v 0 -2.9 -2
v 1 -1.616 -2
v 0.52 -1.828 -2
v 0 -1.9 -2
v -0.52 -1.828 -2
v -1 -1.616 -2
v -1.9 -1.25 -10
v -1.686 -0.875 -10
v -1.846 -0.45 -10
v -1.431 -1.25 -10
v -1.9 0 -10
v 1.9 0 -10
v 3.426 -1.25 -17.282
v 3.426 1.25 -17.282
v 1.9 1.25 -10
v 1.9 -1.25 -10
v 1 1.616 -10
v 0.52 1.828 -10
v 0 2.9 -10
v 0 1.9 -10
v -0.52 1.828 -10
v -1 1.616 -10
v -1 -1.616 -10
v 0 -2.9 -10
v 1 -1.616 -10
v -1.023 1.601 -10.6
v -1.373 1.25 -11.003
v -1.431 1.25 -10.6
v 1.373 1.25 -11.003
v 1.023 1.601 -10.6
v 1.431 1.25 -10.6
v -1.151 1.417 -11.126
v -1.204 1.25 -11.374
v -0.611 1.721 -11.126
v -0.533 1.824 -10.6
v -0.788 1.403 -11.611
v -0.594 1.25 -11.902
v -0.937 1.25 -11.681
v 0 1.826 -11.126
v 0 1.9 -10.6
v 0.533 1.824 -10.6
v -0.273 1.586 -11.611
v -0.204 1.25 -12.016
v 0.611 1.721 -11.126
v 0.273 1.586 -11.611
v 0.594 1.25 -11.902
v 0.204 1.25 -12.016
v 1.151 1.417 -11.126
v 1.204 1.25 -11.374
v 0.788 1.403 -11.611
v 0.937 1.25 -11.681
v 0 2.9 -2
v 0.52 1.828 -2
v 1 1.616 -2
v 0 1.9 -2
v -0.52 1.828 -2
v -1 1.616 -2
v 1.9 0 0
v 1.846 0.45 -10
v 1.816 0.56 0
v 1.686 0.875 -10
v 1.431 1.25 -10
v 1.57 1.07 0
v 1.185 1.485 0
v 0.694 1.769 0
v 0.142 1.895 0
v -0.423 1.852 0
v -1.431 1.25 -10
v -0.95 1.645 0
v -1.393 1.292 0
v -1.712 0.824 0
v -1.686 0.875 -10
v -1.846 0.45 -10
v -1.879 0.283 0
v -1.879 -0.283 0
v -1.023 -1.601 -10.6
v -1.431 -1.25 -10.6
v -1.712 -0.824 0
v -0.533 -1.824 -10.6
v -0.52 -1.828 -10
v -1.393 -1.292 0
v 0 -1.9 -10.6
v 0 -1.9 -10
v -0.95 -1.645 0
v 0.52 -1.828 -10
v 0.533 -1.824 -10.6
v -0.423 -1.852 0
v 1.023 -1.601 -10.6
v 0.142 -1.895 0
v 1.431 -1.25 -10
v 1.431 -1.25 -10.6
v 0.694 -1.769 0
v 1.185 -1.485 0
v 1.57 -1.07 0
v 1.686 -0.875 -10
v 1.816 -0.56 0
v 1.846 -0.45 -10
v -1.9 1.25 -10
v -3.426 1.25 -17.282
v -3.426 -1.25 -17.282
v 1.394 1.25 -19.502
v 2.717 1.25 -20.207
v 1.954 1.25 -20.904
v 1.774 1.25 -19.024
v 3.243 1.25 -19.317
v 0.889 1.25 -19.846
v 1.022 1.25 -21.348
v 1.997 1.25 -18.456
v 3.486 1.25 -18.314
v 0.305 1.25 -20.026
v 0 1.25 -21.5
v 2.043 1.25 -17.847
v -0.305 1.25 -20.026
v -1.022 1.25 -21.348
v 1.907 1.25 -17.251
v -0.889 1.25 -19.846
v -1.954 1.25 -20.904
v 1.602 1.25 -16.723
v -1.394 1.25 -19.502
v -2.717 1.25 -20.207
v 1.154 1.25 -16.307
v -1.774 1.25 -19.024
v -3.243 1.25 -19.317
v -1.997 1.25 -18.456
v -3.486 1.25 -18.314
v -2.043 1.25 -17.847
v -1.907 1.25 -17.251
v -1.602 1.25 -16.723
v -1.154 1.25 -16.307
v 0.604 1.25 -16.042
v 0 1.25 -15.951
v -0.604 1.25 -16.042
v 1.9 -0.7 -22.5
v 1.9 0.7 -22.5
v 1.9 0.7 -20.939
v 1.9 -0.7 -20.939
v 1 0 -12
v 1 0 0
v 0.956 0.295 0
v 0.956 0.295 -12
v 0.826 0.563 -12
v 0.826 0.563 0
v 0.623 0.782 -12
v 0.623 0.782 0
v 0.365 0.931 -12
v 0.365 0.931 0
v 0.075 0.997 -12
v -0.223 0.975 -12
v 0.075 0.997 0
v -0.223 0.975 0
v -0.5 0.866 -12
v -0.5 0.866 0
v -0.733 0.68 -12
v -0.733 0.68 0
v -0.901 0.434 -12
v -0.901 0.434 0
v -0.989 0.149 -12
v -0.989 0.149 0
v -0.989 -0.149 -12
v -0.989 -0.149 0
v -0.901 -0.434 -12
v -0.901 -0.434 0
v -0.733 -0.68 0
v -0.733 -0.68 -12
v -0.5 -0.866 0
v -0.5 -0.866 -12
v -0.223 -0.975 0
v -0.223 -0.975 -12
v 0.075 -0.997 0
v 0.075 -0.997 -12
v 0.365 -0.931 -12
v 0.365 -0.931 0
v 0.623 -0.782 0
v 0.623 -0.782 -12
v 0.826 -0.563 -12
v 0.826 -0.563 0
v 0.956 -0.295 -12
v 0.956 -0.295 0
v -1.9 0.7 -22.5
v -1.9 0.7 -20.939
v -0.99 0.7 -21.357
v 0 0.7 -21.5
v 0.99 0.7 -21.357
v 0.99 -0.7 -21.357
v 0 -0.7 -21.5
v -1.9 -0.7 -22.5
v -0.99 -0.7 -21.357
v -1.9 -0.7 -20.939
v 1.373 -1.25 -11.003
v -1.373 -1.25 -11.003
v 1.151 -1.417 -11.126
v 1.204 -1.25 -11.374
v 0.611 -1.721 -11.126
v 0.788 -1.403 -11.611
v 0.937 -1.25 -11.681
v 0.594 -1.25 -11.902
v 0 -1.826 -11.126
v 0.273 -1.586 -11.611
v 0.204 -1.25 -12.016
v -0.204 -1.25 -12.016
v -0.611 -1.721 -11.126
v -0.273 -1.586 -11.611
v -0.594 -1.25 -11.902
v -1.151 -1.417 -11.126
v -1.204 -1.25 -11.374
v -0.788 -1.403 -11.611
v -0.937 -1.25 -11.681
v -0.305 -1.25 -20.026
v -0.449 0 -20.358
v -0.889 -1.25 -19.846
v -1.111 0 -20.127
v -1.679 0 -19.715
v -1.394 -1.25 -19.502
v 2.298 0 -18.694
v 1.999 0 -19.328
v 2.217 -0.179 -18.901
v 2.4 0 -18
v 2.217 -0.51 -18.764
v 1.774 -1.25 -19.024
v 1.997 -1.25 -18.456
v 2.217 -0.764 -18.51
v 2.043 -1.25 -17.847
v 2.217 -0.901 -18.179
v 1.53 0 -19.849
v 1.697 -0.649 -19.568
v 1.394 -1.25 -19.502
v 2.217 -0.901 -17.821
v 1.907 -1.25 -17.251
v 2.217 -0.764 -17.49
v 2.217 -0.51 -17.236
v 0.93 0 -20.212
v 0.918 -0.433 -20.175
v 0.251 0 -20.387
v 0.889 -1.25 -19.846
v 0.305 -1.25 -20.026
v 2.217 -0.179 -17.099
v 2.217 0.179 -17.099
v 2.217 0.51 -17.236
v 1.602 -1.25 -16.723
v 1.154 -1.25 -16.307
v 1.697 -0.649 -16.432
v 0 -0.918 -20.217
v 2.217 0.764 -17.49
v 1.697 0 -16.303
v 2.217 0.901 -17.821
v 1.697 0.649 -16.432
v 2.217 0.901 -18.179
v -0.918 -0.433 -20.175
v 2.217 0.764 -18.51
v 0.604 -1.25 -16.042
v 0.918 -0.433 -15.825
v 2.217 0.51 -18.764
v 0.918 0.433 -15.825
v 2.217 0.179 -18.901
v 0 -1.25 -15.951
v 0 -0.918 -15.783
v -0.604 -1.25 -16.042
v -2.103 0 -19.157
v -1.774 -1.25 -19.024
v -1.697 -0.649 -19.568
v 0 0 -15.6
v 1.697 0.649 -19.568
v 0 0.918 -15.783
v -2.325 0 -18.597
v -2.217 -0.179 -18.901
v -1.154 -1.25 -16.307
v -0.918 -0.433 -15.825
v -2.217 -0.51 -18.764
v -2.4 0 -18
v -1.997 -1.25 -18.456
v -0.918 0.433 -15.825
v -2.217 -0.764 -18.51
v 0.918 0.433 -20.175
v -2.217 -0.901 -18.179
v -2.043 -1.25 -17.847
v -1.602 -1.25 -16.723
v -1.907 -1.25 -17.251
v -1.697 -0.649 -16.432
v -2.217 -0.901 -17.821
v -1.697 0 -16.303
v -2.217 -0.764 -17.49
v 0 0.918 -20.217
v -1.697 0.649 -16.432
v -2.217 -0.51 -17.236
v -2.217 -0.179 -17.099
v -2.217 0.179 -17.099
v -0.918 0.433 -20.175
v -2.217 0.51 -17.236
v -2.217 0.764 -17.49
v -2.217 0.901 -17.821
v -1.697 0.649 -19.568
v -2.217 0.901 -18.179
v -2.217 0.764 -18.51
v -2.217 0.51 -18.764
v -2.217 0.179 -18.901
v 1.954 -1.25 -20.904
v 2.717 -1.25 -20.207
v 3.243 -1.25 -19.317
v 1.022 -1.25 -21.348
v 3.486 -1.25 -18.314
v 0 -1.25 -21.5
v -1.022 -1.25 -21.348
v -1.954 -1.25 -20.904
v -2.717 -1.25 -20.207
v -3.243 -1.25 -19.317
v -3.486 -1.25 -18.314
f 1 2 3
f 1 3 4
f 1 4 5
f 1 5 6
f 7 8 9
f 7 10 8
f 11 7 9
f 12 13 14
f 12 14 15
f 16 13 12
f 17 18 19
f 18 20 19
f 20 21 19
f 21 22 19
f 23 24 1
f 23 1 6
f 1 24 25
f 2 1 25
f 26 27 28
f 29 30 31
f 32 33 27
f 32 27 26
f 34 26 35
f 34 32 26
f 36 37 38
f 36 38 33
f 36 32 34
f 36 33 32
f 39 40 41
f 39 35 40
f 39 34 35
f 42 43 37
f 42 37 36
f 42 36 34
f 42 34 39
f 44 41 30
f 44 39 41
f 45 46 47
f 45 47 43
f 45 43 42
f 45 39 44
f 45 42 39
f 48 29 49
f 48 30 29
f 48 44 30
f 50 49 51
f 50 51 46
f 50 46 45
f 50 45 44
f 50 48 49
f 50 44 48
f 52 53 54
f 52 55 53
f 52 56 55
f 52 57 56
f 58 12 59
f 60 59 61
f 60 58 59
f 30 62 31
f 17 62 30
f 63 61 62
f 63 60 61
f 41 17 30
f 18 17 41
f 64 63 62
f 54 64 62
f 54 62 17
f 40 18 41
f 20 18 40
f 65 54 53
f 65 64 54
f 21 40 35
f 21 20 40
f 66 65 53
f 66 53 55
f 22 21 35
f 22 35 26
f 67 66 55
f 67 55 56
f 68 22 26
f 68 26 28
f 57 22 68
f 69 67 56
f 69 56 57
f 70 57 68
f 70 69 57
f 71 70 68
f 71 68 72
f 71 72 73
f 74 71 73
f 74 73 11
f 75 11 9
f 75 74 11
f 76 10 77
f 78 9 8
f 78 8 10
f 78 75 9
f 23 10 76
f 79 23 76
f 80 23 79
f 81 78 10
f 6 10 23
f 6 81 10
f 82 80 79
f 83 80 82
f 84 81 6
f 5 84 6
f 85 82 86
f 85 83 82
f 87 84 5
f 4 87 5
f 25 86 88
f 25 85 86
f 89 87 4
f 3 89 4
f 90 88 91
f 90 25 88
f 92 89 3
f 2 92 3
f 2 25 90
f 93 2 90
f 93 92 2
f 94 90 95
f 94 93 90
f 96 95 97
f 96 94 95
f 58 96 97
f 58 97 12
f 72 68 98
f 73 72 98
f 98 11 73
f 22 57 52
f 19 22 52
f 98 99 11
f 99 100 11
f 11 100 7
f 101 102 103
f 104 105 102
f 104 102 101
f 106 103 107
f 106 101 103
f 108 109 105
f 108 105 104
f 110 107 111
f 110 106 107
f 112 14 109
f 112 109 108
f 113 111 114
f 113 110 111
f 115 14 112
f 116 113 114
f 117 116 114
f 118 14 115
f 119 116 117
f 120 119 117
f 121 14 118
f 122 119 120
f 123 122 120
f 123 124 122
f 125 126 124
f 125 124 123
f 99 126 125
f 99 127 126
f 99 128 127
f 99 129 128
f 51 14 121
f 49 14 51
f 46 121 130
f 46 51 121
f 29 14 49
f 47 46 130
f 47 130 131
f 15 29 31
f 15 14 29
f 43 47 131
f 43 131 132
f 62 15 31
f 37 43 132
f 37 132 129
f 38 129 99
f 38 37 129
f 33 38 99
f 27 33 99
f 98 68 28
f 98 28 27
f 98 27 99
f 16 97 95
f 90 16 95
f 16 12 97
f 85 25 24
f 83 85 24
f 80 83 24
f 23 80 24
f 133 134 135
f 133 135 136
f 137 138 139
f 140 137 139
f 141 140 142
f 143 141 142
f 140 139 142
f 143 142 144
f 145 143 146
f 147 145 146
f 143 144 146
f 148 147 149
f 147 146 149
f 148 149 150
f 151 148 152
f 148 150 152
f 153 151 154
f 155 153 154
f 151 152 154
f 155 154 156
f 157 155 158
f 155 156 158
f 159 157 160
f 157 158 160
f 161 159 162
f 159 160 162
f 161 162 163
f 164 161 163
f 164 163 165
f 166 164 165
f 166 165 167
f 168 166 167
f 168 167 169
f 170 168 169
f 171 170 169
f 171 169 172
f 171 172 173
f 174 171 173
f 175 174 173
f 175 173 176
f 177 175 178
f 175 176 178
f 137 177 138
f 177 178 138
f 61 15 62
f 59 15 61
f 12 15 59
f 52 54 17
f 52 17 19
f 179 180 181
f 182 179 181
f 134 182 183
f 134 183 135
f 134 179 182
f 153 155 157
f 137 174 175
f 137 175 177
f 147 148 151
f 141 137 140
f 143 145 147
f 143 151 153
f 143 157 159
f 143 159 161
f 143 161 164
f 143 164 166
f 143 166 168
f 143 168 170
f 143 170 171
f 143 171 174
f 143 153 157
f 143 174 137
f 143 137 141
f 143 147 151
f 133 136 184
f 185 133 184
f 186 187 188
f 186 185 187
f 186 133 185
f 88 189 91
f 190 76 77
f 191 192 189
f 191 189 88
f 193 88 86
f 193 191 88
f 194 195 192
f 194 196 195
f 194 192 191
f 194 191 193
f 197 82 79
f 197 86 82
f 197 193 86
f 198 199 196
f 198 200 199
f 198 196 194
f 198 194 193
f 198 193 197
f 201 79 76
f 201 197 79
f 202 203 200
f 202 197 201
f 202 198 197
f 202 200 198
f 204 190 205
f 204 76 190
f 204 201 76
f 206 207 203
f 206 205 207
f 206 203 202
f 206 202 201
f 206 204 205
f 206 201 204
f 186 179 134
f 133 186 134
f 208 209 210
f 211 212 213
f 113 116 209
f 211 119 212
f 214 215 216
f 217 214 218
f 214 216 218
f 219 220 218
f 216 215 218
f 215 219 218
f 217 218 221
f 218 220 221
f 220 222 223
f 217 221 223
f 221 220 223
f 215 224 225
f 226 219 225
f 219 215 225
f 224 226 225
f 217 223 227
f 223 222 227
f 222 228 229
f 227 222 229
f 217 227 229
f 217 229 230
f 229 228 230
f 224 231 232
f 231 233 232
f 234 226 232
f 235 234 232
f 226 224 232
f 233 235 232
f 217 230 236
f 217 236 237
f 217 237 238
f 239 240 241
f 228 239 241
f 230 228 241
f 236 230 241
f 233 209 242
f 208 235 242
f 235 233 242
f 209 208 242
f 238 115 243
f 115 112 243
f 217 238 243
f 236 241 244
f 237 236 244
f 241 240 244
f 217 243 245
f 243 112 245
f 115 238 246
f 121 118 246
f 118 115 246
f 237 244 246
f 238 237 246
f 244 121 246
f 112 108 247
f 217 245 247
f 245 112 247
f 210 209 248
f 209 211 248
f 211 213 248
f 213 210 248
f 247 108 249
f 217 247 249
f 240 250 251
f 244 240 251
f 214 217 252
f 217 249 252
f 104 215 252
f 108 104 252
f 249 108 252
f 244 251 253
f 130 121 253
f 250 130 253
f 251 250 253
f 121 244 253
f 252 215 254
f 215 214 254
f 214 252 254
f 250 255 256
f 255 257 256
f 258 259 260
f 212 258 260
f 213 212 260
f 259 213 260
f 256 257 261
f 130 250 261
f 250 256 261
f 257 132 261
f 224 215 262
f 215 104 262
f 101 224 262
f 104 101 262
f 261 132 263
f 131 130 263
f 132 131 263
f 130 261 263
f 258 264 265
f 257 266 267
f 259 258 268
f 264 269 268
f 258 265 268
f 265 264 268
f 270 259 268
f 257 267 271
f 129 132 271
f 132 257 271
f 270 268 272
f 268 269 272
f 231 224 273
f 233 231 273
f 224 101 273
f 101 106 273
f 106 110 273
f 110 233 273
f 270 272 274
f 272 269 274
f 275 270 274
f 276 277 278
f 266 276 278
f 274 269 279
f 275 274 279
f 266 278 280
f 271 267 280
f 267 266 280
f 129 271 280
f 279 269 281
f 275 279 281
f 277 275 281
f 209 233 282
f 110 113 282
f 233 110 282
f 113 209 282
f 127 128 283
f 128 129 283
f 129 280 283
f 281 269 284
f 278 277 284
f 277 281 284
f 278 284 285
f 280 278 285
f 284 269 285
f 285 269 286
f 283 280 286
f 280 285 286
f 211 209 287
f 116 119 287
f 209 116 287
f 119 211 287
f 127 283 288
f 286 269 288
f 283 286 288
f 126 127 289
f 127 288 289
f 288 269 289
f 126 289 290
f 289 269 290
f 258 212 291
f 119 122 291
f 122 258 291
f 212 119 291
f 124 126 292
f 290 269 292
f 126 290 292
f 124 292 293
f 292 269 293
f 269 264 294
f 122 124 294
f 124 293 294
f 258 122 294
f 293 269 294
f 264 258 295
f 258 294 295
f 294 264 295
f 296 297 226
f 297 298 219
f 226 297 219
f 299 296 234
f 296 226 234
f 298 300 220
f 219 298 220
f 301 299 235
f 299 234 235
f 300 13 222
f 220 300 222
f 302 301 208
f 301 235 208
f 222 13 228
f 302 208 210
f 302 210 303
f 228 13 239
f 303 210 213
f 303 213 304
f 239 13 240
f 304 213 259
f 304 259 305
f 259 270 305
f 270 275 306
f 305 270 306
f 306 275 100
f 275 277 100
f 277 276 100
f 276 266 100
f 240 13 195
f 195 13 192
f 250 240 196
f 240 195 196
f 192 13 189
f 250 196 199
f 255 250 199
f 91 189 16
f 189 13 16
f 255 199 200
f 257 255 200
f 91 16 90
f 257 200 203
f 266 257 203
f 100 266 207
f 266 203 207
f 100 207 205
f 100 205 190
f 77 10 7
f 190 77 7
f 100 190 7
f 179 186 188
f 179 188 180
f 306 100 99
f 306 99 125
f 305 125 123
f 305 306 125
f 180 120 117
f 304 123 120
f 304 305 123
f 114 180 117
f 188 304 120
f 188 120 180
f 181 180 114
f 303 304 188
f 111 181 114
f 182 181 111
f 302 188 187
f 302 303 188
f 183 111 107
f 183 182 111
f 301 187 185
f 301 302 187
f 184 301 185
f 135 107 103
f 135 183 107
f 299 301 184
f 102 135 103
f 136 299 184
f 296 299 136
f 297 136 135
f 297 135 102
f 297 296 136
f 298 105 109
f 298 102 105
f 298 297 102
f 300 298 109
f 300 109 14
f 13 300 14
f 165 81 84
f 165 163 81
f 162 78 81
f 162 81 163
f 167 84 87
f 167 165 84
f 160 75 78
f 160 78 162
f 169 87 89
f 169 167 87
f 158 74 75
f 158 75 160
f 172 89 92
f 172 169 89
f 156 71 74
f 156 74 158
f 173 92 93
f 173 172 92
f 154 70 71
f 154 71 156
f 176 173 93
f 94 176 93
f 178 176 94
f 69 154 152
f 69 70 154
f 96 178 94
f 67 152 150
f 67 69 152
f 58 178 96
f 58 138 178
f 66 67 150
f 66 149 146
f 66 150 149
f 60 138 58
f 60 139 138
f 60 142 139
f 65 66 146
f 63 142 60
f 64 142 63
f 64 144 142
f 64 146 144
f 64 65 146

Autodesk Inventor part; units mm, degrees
ref_plane "YZ Plane" through (0, 0, 0) normal (1, 0, 0) x (0, 1, 0)
sketch "Sketch2" plane through (0, 0, 0) normal (0, 0, 1) x (1, 0, 0)
  circle A0 centre (0, 0) radius 1.9
  dimension "d0" = 3.8
extrude "Extrusion1" add sketch "Sketch2" against normal blind 12.5
fillet "Fillet1" radius 1.9 1 edges at (-1.9, 0, -12.5)
sketch "Sketch3" plane through (0, 0, 0) normal (0, 1, 0) x (-1, 0, 0)
  line L0 (1.9, 0) -> (-1.9, 0) construction
  arc A0 (-3.4256, -17.2823) -> (3.4256, -17.2823) centre (0, -18) ccw
  line L1 (3.4256, -17.2823) -> (1.9, -10)
  line L2 (-3.4256, -17.2823) -> (-1.9, -10)
  line L3 (0, -27.6) -> (0, 4.6) construction
  line L4 (1.9, 0) -> (1.9, -10.6) construction
  line L5 (-1.9, 0) -> (-1.9, -10.6) construction
  line L6 (-1.9, -10) -> (1.9, -10)
  point P0 (0, 0)
  point P1 (-2.75, -11.75)
  point P2 (2.75, -11.75)
  dimension "d4" = 7
  dimension "d5" = 10
  dimension "d6" = 18
  dimension "d7" = 10
extrude "Extrusion2" add sketch "Sketch3" along normal mid plane 2.5
sketch "Sketch4" plane through (0, 0, 0) normal (0, 1, 0) x (-1, 0, 0)
  arc A0 (-3.4256, -17.2823) -> (3.4256, -17.2823) centre (0, -18) ccw construction
  arc A1 (-2.4, -18) -> (2.4, -18) centre (0, -18) ccw
  line L0 (2.4, -18) -> (-2.4, -18)
  point P0 (0, 0)
  dimension "d10" = 4.8
revolve "Revolution1" cut sketch "Sketch4" angle 360 about axis through (-2.4, 0, -18) along (1, 0, 0)
sketch "Sketch5" plane through (0, 0, 0) normal (0, 0, 1) x (1, 0, 0)
  circle A0 centre (0, 0) radius 1
  dimension "d12" = 2
extrude "Extrusion3" cut sketch "Sketch5" against normal blind 12
thread "Thread1" size "M2x0.4" designation "M2" class "6H" standard "ISO Metric profile" length 110
ref_plane "Work Plane1" through (0, 0, -21.5) normal (0, 0, 1) x (1, 0, 0)
sketch "Sketch6" plane through (0, 0, -21.5) normal (0, 0, 1) x (1, 0, 0)
  line L0 (-4.9, 0) -> (4.9, 0) construction
  line L1 (0, -2.66) -> (0, 2.66) construction
  line L2 (1.9, 0.7) -> (-1.9, 0.7)
  line L3 (-1.9, 0.7) -> (-1.9, -0.7)
  line L4 (-1.9, -0.7) -> (1.9, -0.7)
  line L5 (1.9, -0.7) -> (1.9, 0.7)
  point P0 (0, 0)
  dimension "d17" = 3.8
  dimension "d18" = 1.4
extrude "Extrusion4" add sketch "Sketch6" against normal blind 1
sketch "Sketch7" plane through (0, 0, -21.5) normal (0, 0, 1) x (1, 0, 0)
  line L0 (-1.9, -0.7) -> (-1.9, 0.7) construction
  line L1 (-1.9, 0.7) -> (1.9, 0.7) construction
  line L2 (1.9, 0.7) -> (1.9, -0.7) construction
  line L3 (1.9, -0.7) -> (-1.9, -0.7) construction
  line L4 (-1.9, 0.7) -> (1.9, 0.7)
  line L5 (1.9, 0.7) -> (1.9, -0.7)
  line L6 (1.9, -0.7) -> (-1.9, -0.7)
  line L7 (-1.9, -0.7) -> (-1.9, 0.7)
  point P0 (0, 0)
extrude "Extrusion5" add sketch "Sketch7" along normal up to surface
ref_plane "Work Plane2" through (0, 0, -2) normal (0, 0, 1) x (1, 0, 0)
sketch "Sketch8" plane through (0, 0, -2) normal (0, 0, 1) x (1, 0, 0)
  arc A0 (1.4309, 1.25) -> (-1.4309, 1.25) centre (0, 0) ccw construction
  circle A1 centre (0, 0) radius 1.9
  line L0 (0, -2.98) -> (0, 4.58) construction
  line L1 (-2.66, 0) -> (2.66, 0) construction
  line L2 (-1, 1.6155) -> (0, 2.9)
  line L3 (1, 1.6155) -> (0, 2.9)
  dimension "d24" = 2.9
  dimension "d25" = 2
extrude "Extrusion6" add sketch "Sketch8" against normal blind 8 contours A1 L2 L3
mirror "Mirror1" about plane through (0, 0, 0) normal (0, 1, 0) of "Extrusion6"
equation "\"d5\" = d7"
properties part number "Rotule_M2" material "POM"
